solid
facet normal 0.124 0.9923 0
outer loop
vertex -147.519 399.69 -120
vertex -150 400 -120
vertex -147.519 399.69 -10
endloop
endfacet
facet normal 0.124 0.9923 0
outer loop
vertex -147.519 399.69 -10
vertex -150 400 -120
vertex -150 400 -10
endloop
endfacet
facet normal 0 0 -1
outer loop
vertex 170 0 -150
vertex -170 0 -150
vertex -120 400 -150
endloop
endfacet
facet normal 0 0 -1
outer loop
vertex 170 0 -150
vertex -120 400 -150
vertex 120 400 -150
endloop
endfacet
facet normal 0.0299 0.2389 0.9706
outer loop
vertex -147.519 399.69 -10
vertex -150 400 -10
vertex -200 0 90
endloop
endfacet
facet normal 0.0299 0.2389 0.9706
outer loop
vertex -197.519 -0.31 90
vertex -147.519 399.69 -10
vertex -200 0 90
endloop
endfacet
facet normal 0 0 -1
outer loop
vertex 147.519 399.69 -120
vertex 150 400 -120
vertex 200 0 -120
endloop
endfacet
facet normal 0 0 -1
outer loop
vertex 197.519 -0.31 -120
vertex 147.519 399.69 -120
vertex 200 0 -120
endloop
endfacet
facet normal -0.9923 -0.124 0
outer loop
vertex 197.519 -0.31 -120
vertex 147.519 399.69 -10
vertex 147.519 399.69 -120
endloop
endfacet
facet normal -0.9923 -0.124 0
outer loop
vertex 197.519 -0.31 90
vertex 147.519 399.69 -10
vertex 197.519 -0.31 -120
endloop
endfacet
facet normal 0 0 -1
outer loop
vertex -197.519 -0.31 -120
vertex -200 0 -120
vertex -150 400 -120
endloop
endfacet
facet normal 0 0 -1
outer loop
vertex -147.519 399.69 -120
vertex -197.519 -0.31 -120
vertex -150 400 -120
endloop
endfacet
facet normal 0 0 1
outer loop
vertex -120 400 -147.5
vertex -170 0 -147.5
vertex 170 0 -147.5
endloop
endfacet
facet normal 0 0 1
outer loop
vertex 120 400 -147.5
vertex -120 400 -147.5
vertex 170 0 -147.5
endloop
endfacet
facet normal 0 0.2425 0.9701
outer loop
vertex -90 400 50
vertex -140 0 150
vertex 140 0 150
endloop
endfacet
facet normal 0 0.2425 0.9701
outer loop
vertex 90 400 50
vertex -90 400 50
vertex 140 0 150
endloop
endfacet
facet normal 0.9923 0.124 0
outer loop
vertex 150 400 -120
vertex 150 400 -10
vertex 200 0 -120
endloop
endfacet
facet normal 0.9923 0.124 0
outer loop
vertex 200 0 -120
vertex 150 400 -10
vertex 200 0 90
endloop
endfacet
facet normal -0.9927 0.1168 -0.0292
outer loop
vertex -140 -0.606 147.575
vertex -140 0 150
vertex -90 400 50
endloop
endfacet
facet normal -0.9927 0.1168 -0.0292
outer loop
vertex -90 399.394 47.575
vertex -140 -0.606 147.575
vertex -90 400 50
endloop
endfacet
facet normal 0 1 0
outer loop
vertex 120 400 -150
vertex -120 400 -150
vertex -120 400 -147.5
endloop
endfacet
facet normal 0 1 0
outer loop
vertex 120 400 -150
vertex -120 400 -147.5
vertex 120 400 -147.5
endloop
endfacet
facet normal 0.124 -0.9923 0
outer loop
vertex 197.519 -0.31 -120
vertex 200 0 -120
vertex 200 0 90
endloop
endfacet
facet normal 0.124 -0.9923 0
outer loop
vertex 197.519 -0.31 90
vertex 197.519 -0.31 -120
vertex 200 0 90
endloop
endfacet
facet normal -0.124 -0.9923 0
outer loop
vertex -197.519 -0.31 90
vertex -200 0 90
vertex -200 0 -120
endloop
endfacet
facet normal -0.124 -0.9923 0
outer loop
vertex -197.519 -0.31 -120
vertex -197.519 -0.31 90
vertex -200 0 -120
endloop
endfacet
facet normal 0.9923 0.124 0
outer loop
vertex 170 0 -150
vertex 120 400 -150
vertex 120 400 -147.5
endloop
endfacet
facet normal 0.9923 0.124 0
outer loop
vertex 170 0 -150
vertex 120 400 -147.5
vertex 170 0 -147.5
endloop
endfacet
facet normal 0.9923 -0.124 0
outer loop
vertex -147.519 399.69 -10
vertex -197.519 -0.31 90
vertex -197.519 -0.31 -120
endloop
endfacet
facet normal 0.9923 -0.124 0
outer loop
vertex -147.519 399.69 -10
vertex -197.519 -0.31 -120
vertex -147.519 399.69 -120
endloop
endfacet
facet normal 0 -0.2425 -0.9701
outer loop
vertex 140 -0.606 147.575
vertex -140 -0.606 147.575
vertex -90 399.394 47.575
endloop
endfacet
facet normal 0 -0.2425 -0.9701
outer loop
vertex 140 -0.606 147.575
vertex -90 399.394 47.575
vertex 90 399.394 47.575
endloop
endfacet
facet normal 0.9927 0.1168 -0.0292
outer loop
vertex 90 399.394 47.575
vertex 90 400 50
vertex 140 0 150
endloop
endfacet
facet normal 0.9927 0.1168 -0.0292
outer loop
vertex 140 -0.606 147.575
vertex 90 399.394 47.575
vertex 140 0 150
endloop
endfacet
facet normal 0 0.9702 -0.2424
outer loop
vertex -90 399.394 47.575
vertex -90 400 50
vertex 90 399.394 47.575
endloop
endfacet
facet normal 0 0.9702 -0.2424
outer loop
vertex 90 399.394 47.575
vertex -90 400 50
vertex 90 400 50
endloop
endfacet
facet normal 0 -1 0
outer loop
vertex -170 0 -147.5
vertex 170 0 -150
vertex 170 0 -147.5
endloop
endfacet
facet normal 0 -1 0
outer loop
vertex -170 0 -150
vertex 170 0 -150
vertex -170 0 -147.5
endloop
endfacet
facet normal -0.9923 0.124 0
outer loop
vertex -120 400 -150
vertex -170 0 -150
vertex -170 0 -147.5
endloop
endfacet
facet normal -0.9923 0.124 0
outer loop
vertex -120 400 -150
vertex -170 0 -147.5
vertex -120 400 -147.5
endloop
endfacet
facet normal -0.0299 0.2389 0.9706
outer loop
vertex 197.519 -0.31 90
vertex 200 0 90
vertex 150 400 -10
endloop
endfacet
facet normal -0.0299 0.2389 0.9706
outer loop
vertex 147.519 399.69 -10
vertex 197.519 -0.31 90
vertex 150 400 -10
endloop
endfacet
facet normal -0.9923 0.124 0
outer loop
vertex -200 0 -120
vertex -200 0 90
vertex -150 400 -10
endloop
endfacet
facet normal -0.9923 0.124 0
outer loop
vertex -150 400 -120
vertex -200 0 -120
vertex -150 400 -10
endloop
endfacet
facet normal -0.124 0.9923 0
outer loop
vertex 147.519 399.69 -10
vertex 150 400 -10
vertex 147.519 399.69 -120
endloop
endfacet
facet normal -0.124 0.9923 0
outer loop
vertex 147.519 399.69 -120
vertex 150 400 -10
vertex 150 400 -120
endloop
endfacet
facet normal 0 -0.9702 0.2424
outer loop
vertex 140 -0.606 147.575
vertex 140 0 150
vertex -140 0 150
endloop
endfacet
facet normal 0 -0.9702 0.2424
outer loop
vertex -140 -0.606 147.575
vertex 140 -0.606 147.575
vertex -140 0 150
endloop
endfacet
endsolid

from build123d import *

# Parameters (mm, degrees)
F5_DEPTH  = 2.5
F8_DEPTH  = 2.5
F11_DEPTH = 2.5
F14_DEPTH = 2.5


with BuildPart() as f5:
    # F4 (on face) → F5 (new body)
    with BuildSketch(Plane(origin=(0, 35.294118, 141.176471), x_dir=(1, 0, 0), z_dir=(0, -0.242536, -0.970143))):
        Polygon((90, -375.930219), (140, 36.380344), (-140, 36.380344), (-90, -375.930219), align=None)
    extrude(amount=F5_DEPTH)


with BuildPart() as f8:
    # F7 (on face) → F8 (new body)
    with BuildSketch(Plane(origin=(196.923077, 24.615385, 0), x_dir=(0.124035, -0.992278, 0), z_dir=(-0.992278, -0.124035, 0))):
        Polygon((24.806947, -120), (24.806947, 90), (-378.30594, -10), (-378.30594, -120), align=None)
    extrude(amount=F8_DEPTH)


with BuildPart() as f11:
    # F10 (on face) → F11 (new body)
    with BuildSketch(Plane(origin=(-196.923077, 24.615385, 0), x_dir=(0.124035, 0.992278, 0), z_dir=(0.992278, -0.124035, 0))):
        Polygon((378.30594, -120), (378.30594, -10), (-24.806947, 90), (-24.806947, -120), align=None)
    extrude(amount=F11_DEPTH)


with BuildPart() as f14:
    # F13 (on face) → F14 (new body)
    with BuildSketch(Plane(origin=(0, 0, -150), x_dir=(1, 0, 0), z_dir=(0, 0, -1))):
        Polygon((-170, 0), (-120, -400), (120, -400), (170, 0), align=None)
    extrude(amount=-F14_DEPTH)


solid = Compound([f5.part, f8.part, f11.part, f14.part])
